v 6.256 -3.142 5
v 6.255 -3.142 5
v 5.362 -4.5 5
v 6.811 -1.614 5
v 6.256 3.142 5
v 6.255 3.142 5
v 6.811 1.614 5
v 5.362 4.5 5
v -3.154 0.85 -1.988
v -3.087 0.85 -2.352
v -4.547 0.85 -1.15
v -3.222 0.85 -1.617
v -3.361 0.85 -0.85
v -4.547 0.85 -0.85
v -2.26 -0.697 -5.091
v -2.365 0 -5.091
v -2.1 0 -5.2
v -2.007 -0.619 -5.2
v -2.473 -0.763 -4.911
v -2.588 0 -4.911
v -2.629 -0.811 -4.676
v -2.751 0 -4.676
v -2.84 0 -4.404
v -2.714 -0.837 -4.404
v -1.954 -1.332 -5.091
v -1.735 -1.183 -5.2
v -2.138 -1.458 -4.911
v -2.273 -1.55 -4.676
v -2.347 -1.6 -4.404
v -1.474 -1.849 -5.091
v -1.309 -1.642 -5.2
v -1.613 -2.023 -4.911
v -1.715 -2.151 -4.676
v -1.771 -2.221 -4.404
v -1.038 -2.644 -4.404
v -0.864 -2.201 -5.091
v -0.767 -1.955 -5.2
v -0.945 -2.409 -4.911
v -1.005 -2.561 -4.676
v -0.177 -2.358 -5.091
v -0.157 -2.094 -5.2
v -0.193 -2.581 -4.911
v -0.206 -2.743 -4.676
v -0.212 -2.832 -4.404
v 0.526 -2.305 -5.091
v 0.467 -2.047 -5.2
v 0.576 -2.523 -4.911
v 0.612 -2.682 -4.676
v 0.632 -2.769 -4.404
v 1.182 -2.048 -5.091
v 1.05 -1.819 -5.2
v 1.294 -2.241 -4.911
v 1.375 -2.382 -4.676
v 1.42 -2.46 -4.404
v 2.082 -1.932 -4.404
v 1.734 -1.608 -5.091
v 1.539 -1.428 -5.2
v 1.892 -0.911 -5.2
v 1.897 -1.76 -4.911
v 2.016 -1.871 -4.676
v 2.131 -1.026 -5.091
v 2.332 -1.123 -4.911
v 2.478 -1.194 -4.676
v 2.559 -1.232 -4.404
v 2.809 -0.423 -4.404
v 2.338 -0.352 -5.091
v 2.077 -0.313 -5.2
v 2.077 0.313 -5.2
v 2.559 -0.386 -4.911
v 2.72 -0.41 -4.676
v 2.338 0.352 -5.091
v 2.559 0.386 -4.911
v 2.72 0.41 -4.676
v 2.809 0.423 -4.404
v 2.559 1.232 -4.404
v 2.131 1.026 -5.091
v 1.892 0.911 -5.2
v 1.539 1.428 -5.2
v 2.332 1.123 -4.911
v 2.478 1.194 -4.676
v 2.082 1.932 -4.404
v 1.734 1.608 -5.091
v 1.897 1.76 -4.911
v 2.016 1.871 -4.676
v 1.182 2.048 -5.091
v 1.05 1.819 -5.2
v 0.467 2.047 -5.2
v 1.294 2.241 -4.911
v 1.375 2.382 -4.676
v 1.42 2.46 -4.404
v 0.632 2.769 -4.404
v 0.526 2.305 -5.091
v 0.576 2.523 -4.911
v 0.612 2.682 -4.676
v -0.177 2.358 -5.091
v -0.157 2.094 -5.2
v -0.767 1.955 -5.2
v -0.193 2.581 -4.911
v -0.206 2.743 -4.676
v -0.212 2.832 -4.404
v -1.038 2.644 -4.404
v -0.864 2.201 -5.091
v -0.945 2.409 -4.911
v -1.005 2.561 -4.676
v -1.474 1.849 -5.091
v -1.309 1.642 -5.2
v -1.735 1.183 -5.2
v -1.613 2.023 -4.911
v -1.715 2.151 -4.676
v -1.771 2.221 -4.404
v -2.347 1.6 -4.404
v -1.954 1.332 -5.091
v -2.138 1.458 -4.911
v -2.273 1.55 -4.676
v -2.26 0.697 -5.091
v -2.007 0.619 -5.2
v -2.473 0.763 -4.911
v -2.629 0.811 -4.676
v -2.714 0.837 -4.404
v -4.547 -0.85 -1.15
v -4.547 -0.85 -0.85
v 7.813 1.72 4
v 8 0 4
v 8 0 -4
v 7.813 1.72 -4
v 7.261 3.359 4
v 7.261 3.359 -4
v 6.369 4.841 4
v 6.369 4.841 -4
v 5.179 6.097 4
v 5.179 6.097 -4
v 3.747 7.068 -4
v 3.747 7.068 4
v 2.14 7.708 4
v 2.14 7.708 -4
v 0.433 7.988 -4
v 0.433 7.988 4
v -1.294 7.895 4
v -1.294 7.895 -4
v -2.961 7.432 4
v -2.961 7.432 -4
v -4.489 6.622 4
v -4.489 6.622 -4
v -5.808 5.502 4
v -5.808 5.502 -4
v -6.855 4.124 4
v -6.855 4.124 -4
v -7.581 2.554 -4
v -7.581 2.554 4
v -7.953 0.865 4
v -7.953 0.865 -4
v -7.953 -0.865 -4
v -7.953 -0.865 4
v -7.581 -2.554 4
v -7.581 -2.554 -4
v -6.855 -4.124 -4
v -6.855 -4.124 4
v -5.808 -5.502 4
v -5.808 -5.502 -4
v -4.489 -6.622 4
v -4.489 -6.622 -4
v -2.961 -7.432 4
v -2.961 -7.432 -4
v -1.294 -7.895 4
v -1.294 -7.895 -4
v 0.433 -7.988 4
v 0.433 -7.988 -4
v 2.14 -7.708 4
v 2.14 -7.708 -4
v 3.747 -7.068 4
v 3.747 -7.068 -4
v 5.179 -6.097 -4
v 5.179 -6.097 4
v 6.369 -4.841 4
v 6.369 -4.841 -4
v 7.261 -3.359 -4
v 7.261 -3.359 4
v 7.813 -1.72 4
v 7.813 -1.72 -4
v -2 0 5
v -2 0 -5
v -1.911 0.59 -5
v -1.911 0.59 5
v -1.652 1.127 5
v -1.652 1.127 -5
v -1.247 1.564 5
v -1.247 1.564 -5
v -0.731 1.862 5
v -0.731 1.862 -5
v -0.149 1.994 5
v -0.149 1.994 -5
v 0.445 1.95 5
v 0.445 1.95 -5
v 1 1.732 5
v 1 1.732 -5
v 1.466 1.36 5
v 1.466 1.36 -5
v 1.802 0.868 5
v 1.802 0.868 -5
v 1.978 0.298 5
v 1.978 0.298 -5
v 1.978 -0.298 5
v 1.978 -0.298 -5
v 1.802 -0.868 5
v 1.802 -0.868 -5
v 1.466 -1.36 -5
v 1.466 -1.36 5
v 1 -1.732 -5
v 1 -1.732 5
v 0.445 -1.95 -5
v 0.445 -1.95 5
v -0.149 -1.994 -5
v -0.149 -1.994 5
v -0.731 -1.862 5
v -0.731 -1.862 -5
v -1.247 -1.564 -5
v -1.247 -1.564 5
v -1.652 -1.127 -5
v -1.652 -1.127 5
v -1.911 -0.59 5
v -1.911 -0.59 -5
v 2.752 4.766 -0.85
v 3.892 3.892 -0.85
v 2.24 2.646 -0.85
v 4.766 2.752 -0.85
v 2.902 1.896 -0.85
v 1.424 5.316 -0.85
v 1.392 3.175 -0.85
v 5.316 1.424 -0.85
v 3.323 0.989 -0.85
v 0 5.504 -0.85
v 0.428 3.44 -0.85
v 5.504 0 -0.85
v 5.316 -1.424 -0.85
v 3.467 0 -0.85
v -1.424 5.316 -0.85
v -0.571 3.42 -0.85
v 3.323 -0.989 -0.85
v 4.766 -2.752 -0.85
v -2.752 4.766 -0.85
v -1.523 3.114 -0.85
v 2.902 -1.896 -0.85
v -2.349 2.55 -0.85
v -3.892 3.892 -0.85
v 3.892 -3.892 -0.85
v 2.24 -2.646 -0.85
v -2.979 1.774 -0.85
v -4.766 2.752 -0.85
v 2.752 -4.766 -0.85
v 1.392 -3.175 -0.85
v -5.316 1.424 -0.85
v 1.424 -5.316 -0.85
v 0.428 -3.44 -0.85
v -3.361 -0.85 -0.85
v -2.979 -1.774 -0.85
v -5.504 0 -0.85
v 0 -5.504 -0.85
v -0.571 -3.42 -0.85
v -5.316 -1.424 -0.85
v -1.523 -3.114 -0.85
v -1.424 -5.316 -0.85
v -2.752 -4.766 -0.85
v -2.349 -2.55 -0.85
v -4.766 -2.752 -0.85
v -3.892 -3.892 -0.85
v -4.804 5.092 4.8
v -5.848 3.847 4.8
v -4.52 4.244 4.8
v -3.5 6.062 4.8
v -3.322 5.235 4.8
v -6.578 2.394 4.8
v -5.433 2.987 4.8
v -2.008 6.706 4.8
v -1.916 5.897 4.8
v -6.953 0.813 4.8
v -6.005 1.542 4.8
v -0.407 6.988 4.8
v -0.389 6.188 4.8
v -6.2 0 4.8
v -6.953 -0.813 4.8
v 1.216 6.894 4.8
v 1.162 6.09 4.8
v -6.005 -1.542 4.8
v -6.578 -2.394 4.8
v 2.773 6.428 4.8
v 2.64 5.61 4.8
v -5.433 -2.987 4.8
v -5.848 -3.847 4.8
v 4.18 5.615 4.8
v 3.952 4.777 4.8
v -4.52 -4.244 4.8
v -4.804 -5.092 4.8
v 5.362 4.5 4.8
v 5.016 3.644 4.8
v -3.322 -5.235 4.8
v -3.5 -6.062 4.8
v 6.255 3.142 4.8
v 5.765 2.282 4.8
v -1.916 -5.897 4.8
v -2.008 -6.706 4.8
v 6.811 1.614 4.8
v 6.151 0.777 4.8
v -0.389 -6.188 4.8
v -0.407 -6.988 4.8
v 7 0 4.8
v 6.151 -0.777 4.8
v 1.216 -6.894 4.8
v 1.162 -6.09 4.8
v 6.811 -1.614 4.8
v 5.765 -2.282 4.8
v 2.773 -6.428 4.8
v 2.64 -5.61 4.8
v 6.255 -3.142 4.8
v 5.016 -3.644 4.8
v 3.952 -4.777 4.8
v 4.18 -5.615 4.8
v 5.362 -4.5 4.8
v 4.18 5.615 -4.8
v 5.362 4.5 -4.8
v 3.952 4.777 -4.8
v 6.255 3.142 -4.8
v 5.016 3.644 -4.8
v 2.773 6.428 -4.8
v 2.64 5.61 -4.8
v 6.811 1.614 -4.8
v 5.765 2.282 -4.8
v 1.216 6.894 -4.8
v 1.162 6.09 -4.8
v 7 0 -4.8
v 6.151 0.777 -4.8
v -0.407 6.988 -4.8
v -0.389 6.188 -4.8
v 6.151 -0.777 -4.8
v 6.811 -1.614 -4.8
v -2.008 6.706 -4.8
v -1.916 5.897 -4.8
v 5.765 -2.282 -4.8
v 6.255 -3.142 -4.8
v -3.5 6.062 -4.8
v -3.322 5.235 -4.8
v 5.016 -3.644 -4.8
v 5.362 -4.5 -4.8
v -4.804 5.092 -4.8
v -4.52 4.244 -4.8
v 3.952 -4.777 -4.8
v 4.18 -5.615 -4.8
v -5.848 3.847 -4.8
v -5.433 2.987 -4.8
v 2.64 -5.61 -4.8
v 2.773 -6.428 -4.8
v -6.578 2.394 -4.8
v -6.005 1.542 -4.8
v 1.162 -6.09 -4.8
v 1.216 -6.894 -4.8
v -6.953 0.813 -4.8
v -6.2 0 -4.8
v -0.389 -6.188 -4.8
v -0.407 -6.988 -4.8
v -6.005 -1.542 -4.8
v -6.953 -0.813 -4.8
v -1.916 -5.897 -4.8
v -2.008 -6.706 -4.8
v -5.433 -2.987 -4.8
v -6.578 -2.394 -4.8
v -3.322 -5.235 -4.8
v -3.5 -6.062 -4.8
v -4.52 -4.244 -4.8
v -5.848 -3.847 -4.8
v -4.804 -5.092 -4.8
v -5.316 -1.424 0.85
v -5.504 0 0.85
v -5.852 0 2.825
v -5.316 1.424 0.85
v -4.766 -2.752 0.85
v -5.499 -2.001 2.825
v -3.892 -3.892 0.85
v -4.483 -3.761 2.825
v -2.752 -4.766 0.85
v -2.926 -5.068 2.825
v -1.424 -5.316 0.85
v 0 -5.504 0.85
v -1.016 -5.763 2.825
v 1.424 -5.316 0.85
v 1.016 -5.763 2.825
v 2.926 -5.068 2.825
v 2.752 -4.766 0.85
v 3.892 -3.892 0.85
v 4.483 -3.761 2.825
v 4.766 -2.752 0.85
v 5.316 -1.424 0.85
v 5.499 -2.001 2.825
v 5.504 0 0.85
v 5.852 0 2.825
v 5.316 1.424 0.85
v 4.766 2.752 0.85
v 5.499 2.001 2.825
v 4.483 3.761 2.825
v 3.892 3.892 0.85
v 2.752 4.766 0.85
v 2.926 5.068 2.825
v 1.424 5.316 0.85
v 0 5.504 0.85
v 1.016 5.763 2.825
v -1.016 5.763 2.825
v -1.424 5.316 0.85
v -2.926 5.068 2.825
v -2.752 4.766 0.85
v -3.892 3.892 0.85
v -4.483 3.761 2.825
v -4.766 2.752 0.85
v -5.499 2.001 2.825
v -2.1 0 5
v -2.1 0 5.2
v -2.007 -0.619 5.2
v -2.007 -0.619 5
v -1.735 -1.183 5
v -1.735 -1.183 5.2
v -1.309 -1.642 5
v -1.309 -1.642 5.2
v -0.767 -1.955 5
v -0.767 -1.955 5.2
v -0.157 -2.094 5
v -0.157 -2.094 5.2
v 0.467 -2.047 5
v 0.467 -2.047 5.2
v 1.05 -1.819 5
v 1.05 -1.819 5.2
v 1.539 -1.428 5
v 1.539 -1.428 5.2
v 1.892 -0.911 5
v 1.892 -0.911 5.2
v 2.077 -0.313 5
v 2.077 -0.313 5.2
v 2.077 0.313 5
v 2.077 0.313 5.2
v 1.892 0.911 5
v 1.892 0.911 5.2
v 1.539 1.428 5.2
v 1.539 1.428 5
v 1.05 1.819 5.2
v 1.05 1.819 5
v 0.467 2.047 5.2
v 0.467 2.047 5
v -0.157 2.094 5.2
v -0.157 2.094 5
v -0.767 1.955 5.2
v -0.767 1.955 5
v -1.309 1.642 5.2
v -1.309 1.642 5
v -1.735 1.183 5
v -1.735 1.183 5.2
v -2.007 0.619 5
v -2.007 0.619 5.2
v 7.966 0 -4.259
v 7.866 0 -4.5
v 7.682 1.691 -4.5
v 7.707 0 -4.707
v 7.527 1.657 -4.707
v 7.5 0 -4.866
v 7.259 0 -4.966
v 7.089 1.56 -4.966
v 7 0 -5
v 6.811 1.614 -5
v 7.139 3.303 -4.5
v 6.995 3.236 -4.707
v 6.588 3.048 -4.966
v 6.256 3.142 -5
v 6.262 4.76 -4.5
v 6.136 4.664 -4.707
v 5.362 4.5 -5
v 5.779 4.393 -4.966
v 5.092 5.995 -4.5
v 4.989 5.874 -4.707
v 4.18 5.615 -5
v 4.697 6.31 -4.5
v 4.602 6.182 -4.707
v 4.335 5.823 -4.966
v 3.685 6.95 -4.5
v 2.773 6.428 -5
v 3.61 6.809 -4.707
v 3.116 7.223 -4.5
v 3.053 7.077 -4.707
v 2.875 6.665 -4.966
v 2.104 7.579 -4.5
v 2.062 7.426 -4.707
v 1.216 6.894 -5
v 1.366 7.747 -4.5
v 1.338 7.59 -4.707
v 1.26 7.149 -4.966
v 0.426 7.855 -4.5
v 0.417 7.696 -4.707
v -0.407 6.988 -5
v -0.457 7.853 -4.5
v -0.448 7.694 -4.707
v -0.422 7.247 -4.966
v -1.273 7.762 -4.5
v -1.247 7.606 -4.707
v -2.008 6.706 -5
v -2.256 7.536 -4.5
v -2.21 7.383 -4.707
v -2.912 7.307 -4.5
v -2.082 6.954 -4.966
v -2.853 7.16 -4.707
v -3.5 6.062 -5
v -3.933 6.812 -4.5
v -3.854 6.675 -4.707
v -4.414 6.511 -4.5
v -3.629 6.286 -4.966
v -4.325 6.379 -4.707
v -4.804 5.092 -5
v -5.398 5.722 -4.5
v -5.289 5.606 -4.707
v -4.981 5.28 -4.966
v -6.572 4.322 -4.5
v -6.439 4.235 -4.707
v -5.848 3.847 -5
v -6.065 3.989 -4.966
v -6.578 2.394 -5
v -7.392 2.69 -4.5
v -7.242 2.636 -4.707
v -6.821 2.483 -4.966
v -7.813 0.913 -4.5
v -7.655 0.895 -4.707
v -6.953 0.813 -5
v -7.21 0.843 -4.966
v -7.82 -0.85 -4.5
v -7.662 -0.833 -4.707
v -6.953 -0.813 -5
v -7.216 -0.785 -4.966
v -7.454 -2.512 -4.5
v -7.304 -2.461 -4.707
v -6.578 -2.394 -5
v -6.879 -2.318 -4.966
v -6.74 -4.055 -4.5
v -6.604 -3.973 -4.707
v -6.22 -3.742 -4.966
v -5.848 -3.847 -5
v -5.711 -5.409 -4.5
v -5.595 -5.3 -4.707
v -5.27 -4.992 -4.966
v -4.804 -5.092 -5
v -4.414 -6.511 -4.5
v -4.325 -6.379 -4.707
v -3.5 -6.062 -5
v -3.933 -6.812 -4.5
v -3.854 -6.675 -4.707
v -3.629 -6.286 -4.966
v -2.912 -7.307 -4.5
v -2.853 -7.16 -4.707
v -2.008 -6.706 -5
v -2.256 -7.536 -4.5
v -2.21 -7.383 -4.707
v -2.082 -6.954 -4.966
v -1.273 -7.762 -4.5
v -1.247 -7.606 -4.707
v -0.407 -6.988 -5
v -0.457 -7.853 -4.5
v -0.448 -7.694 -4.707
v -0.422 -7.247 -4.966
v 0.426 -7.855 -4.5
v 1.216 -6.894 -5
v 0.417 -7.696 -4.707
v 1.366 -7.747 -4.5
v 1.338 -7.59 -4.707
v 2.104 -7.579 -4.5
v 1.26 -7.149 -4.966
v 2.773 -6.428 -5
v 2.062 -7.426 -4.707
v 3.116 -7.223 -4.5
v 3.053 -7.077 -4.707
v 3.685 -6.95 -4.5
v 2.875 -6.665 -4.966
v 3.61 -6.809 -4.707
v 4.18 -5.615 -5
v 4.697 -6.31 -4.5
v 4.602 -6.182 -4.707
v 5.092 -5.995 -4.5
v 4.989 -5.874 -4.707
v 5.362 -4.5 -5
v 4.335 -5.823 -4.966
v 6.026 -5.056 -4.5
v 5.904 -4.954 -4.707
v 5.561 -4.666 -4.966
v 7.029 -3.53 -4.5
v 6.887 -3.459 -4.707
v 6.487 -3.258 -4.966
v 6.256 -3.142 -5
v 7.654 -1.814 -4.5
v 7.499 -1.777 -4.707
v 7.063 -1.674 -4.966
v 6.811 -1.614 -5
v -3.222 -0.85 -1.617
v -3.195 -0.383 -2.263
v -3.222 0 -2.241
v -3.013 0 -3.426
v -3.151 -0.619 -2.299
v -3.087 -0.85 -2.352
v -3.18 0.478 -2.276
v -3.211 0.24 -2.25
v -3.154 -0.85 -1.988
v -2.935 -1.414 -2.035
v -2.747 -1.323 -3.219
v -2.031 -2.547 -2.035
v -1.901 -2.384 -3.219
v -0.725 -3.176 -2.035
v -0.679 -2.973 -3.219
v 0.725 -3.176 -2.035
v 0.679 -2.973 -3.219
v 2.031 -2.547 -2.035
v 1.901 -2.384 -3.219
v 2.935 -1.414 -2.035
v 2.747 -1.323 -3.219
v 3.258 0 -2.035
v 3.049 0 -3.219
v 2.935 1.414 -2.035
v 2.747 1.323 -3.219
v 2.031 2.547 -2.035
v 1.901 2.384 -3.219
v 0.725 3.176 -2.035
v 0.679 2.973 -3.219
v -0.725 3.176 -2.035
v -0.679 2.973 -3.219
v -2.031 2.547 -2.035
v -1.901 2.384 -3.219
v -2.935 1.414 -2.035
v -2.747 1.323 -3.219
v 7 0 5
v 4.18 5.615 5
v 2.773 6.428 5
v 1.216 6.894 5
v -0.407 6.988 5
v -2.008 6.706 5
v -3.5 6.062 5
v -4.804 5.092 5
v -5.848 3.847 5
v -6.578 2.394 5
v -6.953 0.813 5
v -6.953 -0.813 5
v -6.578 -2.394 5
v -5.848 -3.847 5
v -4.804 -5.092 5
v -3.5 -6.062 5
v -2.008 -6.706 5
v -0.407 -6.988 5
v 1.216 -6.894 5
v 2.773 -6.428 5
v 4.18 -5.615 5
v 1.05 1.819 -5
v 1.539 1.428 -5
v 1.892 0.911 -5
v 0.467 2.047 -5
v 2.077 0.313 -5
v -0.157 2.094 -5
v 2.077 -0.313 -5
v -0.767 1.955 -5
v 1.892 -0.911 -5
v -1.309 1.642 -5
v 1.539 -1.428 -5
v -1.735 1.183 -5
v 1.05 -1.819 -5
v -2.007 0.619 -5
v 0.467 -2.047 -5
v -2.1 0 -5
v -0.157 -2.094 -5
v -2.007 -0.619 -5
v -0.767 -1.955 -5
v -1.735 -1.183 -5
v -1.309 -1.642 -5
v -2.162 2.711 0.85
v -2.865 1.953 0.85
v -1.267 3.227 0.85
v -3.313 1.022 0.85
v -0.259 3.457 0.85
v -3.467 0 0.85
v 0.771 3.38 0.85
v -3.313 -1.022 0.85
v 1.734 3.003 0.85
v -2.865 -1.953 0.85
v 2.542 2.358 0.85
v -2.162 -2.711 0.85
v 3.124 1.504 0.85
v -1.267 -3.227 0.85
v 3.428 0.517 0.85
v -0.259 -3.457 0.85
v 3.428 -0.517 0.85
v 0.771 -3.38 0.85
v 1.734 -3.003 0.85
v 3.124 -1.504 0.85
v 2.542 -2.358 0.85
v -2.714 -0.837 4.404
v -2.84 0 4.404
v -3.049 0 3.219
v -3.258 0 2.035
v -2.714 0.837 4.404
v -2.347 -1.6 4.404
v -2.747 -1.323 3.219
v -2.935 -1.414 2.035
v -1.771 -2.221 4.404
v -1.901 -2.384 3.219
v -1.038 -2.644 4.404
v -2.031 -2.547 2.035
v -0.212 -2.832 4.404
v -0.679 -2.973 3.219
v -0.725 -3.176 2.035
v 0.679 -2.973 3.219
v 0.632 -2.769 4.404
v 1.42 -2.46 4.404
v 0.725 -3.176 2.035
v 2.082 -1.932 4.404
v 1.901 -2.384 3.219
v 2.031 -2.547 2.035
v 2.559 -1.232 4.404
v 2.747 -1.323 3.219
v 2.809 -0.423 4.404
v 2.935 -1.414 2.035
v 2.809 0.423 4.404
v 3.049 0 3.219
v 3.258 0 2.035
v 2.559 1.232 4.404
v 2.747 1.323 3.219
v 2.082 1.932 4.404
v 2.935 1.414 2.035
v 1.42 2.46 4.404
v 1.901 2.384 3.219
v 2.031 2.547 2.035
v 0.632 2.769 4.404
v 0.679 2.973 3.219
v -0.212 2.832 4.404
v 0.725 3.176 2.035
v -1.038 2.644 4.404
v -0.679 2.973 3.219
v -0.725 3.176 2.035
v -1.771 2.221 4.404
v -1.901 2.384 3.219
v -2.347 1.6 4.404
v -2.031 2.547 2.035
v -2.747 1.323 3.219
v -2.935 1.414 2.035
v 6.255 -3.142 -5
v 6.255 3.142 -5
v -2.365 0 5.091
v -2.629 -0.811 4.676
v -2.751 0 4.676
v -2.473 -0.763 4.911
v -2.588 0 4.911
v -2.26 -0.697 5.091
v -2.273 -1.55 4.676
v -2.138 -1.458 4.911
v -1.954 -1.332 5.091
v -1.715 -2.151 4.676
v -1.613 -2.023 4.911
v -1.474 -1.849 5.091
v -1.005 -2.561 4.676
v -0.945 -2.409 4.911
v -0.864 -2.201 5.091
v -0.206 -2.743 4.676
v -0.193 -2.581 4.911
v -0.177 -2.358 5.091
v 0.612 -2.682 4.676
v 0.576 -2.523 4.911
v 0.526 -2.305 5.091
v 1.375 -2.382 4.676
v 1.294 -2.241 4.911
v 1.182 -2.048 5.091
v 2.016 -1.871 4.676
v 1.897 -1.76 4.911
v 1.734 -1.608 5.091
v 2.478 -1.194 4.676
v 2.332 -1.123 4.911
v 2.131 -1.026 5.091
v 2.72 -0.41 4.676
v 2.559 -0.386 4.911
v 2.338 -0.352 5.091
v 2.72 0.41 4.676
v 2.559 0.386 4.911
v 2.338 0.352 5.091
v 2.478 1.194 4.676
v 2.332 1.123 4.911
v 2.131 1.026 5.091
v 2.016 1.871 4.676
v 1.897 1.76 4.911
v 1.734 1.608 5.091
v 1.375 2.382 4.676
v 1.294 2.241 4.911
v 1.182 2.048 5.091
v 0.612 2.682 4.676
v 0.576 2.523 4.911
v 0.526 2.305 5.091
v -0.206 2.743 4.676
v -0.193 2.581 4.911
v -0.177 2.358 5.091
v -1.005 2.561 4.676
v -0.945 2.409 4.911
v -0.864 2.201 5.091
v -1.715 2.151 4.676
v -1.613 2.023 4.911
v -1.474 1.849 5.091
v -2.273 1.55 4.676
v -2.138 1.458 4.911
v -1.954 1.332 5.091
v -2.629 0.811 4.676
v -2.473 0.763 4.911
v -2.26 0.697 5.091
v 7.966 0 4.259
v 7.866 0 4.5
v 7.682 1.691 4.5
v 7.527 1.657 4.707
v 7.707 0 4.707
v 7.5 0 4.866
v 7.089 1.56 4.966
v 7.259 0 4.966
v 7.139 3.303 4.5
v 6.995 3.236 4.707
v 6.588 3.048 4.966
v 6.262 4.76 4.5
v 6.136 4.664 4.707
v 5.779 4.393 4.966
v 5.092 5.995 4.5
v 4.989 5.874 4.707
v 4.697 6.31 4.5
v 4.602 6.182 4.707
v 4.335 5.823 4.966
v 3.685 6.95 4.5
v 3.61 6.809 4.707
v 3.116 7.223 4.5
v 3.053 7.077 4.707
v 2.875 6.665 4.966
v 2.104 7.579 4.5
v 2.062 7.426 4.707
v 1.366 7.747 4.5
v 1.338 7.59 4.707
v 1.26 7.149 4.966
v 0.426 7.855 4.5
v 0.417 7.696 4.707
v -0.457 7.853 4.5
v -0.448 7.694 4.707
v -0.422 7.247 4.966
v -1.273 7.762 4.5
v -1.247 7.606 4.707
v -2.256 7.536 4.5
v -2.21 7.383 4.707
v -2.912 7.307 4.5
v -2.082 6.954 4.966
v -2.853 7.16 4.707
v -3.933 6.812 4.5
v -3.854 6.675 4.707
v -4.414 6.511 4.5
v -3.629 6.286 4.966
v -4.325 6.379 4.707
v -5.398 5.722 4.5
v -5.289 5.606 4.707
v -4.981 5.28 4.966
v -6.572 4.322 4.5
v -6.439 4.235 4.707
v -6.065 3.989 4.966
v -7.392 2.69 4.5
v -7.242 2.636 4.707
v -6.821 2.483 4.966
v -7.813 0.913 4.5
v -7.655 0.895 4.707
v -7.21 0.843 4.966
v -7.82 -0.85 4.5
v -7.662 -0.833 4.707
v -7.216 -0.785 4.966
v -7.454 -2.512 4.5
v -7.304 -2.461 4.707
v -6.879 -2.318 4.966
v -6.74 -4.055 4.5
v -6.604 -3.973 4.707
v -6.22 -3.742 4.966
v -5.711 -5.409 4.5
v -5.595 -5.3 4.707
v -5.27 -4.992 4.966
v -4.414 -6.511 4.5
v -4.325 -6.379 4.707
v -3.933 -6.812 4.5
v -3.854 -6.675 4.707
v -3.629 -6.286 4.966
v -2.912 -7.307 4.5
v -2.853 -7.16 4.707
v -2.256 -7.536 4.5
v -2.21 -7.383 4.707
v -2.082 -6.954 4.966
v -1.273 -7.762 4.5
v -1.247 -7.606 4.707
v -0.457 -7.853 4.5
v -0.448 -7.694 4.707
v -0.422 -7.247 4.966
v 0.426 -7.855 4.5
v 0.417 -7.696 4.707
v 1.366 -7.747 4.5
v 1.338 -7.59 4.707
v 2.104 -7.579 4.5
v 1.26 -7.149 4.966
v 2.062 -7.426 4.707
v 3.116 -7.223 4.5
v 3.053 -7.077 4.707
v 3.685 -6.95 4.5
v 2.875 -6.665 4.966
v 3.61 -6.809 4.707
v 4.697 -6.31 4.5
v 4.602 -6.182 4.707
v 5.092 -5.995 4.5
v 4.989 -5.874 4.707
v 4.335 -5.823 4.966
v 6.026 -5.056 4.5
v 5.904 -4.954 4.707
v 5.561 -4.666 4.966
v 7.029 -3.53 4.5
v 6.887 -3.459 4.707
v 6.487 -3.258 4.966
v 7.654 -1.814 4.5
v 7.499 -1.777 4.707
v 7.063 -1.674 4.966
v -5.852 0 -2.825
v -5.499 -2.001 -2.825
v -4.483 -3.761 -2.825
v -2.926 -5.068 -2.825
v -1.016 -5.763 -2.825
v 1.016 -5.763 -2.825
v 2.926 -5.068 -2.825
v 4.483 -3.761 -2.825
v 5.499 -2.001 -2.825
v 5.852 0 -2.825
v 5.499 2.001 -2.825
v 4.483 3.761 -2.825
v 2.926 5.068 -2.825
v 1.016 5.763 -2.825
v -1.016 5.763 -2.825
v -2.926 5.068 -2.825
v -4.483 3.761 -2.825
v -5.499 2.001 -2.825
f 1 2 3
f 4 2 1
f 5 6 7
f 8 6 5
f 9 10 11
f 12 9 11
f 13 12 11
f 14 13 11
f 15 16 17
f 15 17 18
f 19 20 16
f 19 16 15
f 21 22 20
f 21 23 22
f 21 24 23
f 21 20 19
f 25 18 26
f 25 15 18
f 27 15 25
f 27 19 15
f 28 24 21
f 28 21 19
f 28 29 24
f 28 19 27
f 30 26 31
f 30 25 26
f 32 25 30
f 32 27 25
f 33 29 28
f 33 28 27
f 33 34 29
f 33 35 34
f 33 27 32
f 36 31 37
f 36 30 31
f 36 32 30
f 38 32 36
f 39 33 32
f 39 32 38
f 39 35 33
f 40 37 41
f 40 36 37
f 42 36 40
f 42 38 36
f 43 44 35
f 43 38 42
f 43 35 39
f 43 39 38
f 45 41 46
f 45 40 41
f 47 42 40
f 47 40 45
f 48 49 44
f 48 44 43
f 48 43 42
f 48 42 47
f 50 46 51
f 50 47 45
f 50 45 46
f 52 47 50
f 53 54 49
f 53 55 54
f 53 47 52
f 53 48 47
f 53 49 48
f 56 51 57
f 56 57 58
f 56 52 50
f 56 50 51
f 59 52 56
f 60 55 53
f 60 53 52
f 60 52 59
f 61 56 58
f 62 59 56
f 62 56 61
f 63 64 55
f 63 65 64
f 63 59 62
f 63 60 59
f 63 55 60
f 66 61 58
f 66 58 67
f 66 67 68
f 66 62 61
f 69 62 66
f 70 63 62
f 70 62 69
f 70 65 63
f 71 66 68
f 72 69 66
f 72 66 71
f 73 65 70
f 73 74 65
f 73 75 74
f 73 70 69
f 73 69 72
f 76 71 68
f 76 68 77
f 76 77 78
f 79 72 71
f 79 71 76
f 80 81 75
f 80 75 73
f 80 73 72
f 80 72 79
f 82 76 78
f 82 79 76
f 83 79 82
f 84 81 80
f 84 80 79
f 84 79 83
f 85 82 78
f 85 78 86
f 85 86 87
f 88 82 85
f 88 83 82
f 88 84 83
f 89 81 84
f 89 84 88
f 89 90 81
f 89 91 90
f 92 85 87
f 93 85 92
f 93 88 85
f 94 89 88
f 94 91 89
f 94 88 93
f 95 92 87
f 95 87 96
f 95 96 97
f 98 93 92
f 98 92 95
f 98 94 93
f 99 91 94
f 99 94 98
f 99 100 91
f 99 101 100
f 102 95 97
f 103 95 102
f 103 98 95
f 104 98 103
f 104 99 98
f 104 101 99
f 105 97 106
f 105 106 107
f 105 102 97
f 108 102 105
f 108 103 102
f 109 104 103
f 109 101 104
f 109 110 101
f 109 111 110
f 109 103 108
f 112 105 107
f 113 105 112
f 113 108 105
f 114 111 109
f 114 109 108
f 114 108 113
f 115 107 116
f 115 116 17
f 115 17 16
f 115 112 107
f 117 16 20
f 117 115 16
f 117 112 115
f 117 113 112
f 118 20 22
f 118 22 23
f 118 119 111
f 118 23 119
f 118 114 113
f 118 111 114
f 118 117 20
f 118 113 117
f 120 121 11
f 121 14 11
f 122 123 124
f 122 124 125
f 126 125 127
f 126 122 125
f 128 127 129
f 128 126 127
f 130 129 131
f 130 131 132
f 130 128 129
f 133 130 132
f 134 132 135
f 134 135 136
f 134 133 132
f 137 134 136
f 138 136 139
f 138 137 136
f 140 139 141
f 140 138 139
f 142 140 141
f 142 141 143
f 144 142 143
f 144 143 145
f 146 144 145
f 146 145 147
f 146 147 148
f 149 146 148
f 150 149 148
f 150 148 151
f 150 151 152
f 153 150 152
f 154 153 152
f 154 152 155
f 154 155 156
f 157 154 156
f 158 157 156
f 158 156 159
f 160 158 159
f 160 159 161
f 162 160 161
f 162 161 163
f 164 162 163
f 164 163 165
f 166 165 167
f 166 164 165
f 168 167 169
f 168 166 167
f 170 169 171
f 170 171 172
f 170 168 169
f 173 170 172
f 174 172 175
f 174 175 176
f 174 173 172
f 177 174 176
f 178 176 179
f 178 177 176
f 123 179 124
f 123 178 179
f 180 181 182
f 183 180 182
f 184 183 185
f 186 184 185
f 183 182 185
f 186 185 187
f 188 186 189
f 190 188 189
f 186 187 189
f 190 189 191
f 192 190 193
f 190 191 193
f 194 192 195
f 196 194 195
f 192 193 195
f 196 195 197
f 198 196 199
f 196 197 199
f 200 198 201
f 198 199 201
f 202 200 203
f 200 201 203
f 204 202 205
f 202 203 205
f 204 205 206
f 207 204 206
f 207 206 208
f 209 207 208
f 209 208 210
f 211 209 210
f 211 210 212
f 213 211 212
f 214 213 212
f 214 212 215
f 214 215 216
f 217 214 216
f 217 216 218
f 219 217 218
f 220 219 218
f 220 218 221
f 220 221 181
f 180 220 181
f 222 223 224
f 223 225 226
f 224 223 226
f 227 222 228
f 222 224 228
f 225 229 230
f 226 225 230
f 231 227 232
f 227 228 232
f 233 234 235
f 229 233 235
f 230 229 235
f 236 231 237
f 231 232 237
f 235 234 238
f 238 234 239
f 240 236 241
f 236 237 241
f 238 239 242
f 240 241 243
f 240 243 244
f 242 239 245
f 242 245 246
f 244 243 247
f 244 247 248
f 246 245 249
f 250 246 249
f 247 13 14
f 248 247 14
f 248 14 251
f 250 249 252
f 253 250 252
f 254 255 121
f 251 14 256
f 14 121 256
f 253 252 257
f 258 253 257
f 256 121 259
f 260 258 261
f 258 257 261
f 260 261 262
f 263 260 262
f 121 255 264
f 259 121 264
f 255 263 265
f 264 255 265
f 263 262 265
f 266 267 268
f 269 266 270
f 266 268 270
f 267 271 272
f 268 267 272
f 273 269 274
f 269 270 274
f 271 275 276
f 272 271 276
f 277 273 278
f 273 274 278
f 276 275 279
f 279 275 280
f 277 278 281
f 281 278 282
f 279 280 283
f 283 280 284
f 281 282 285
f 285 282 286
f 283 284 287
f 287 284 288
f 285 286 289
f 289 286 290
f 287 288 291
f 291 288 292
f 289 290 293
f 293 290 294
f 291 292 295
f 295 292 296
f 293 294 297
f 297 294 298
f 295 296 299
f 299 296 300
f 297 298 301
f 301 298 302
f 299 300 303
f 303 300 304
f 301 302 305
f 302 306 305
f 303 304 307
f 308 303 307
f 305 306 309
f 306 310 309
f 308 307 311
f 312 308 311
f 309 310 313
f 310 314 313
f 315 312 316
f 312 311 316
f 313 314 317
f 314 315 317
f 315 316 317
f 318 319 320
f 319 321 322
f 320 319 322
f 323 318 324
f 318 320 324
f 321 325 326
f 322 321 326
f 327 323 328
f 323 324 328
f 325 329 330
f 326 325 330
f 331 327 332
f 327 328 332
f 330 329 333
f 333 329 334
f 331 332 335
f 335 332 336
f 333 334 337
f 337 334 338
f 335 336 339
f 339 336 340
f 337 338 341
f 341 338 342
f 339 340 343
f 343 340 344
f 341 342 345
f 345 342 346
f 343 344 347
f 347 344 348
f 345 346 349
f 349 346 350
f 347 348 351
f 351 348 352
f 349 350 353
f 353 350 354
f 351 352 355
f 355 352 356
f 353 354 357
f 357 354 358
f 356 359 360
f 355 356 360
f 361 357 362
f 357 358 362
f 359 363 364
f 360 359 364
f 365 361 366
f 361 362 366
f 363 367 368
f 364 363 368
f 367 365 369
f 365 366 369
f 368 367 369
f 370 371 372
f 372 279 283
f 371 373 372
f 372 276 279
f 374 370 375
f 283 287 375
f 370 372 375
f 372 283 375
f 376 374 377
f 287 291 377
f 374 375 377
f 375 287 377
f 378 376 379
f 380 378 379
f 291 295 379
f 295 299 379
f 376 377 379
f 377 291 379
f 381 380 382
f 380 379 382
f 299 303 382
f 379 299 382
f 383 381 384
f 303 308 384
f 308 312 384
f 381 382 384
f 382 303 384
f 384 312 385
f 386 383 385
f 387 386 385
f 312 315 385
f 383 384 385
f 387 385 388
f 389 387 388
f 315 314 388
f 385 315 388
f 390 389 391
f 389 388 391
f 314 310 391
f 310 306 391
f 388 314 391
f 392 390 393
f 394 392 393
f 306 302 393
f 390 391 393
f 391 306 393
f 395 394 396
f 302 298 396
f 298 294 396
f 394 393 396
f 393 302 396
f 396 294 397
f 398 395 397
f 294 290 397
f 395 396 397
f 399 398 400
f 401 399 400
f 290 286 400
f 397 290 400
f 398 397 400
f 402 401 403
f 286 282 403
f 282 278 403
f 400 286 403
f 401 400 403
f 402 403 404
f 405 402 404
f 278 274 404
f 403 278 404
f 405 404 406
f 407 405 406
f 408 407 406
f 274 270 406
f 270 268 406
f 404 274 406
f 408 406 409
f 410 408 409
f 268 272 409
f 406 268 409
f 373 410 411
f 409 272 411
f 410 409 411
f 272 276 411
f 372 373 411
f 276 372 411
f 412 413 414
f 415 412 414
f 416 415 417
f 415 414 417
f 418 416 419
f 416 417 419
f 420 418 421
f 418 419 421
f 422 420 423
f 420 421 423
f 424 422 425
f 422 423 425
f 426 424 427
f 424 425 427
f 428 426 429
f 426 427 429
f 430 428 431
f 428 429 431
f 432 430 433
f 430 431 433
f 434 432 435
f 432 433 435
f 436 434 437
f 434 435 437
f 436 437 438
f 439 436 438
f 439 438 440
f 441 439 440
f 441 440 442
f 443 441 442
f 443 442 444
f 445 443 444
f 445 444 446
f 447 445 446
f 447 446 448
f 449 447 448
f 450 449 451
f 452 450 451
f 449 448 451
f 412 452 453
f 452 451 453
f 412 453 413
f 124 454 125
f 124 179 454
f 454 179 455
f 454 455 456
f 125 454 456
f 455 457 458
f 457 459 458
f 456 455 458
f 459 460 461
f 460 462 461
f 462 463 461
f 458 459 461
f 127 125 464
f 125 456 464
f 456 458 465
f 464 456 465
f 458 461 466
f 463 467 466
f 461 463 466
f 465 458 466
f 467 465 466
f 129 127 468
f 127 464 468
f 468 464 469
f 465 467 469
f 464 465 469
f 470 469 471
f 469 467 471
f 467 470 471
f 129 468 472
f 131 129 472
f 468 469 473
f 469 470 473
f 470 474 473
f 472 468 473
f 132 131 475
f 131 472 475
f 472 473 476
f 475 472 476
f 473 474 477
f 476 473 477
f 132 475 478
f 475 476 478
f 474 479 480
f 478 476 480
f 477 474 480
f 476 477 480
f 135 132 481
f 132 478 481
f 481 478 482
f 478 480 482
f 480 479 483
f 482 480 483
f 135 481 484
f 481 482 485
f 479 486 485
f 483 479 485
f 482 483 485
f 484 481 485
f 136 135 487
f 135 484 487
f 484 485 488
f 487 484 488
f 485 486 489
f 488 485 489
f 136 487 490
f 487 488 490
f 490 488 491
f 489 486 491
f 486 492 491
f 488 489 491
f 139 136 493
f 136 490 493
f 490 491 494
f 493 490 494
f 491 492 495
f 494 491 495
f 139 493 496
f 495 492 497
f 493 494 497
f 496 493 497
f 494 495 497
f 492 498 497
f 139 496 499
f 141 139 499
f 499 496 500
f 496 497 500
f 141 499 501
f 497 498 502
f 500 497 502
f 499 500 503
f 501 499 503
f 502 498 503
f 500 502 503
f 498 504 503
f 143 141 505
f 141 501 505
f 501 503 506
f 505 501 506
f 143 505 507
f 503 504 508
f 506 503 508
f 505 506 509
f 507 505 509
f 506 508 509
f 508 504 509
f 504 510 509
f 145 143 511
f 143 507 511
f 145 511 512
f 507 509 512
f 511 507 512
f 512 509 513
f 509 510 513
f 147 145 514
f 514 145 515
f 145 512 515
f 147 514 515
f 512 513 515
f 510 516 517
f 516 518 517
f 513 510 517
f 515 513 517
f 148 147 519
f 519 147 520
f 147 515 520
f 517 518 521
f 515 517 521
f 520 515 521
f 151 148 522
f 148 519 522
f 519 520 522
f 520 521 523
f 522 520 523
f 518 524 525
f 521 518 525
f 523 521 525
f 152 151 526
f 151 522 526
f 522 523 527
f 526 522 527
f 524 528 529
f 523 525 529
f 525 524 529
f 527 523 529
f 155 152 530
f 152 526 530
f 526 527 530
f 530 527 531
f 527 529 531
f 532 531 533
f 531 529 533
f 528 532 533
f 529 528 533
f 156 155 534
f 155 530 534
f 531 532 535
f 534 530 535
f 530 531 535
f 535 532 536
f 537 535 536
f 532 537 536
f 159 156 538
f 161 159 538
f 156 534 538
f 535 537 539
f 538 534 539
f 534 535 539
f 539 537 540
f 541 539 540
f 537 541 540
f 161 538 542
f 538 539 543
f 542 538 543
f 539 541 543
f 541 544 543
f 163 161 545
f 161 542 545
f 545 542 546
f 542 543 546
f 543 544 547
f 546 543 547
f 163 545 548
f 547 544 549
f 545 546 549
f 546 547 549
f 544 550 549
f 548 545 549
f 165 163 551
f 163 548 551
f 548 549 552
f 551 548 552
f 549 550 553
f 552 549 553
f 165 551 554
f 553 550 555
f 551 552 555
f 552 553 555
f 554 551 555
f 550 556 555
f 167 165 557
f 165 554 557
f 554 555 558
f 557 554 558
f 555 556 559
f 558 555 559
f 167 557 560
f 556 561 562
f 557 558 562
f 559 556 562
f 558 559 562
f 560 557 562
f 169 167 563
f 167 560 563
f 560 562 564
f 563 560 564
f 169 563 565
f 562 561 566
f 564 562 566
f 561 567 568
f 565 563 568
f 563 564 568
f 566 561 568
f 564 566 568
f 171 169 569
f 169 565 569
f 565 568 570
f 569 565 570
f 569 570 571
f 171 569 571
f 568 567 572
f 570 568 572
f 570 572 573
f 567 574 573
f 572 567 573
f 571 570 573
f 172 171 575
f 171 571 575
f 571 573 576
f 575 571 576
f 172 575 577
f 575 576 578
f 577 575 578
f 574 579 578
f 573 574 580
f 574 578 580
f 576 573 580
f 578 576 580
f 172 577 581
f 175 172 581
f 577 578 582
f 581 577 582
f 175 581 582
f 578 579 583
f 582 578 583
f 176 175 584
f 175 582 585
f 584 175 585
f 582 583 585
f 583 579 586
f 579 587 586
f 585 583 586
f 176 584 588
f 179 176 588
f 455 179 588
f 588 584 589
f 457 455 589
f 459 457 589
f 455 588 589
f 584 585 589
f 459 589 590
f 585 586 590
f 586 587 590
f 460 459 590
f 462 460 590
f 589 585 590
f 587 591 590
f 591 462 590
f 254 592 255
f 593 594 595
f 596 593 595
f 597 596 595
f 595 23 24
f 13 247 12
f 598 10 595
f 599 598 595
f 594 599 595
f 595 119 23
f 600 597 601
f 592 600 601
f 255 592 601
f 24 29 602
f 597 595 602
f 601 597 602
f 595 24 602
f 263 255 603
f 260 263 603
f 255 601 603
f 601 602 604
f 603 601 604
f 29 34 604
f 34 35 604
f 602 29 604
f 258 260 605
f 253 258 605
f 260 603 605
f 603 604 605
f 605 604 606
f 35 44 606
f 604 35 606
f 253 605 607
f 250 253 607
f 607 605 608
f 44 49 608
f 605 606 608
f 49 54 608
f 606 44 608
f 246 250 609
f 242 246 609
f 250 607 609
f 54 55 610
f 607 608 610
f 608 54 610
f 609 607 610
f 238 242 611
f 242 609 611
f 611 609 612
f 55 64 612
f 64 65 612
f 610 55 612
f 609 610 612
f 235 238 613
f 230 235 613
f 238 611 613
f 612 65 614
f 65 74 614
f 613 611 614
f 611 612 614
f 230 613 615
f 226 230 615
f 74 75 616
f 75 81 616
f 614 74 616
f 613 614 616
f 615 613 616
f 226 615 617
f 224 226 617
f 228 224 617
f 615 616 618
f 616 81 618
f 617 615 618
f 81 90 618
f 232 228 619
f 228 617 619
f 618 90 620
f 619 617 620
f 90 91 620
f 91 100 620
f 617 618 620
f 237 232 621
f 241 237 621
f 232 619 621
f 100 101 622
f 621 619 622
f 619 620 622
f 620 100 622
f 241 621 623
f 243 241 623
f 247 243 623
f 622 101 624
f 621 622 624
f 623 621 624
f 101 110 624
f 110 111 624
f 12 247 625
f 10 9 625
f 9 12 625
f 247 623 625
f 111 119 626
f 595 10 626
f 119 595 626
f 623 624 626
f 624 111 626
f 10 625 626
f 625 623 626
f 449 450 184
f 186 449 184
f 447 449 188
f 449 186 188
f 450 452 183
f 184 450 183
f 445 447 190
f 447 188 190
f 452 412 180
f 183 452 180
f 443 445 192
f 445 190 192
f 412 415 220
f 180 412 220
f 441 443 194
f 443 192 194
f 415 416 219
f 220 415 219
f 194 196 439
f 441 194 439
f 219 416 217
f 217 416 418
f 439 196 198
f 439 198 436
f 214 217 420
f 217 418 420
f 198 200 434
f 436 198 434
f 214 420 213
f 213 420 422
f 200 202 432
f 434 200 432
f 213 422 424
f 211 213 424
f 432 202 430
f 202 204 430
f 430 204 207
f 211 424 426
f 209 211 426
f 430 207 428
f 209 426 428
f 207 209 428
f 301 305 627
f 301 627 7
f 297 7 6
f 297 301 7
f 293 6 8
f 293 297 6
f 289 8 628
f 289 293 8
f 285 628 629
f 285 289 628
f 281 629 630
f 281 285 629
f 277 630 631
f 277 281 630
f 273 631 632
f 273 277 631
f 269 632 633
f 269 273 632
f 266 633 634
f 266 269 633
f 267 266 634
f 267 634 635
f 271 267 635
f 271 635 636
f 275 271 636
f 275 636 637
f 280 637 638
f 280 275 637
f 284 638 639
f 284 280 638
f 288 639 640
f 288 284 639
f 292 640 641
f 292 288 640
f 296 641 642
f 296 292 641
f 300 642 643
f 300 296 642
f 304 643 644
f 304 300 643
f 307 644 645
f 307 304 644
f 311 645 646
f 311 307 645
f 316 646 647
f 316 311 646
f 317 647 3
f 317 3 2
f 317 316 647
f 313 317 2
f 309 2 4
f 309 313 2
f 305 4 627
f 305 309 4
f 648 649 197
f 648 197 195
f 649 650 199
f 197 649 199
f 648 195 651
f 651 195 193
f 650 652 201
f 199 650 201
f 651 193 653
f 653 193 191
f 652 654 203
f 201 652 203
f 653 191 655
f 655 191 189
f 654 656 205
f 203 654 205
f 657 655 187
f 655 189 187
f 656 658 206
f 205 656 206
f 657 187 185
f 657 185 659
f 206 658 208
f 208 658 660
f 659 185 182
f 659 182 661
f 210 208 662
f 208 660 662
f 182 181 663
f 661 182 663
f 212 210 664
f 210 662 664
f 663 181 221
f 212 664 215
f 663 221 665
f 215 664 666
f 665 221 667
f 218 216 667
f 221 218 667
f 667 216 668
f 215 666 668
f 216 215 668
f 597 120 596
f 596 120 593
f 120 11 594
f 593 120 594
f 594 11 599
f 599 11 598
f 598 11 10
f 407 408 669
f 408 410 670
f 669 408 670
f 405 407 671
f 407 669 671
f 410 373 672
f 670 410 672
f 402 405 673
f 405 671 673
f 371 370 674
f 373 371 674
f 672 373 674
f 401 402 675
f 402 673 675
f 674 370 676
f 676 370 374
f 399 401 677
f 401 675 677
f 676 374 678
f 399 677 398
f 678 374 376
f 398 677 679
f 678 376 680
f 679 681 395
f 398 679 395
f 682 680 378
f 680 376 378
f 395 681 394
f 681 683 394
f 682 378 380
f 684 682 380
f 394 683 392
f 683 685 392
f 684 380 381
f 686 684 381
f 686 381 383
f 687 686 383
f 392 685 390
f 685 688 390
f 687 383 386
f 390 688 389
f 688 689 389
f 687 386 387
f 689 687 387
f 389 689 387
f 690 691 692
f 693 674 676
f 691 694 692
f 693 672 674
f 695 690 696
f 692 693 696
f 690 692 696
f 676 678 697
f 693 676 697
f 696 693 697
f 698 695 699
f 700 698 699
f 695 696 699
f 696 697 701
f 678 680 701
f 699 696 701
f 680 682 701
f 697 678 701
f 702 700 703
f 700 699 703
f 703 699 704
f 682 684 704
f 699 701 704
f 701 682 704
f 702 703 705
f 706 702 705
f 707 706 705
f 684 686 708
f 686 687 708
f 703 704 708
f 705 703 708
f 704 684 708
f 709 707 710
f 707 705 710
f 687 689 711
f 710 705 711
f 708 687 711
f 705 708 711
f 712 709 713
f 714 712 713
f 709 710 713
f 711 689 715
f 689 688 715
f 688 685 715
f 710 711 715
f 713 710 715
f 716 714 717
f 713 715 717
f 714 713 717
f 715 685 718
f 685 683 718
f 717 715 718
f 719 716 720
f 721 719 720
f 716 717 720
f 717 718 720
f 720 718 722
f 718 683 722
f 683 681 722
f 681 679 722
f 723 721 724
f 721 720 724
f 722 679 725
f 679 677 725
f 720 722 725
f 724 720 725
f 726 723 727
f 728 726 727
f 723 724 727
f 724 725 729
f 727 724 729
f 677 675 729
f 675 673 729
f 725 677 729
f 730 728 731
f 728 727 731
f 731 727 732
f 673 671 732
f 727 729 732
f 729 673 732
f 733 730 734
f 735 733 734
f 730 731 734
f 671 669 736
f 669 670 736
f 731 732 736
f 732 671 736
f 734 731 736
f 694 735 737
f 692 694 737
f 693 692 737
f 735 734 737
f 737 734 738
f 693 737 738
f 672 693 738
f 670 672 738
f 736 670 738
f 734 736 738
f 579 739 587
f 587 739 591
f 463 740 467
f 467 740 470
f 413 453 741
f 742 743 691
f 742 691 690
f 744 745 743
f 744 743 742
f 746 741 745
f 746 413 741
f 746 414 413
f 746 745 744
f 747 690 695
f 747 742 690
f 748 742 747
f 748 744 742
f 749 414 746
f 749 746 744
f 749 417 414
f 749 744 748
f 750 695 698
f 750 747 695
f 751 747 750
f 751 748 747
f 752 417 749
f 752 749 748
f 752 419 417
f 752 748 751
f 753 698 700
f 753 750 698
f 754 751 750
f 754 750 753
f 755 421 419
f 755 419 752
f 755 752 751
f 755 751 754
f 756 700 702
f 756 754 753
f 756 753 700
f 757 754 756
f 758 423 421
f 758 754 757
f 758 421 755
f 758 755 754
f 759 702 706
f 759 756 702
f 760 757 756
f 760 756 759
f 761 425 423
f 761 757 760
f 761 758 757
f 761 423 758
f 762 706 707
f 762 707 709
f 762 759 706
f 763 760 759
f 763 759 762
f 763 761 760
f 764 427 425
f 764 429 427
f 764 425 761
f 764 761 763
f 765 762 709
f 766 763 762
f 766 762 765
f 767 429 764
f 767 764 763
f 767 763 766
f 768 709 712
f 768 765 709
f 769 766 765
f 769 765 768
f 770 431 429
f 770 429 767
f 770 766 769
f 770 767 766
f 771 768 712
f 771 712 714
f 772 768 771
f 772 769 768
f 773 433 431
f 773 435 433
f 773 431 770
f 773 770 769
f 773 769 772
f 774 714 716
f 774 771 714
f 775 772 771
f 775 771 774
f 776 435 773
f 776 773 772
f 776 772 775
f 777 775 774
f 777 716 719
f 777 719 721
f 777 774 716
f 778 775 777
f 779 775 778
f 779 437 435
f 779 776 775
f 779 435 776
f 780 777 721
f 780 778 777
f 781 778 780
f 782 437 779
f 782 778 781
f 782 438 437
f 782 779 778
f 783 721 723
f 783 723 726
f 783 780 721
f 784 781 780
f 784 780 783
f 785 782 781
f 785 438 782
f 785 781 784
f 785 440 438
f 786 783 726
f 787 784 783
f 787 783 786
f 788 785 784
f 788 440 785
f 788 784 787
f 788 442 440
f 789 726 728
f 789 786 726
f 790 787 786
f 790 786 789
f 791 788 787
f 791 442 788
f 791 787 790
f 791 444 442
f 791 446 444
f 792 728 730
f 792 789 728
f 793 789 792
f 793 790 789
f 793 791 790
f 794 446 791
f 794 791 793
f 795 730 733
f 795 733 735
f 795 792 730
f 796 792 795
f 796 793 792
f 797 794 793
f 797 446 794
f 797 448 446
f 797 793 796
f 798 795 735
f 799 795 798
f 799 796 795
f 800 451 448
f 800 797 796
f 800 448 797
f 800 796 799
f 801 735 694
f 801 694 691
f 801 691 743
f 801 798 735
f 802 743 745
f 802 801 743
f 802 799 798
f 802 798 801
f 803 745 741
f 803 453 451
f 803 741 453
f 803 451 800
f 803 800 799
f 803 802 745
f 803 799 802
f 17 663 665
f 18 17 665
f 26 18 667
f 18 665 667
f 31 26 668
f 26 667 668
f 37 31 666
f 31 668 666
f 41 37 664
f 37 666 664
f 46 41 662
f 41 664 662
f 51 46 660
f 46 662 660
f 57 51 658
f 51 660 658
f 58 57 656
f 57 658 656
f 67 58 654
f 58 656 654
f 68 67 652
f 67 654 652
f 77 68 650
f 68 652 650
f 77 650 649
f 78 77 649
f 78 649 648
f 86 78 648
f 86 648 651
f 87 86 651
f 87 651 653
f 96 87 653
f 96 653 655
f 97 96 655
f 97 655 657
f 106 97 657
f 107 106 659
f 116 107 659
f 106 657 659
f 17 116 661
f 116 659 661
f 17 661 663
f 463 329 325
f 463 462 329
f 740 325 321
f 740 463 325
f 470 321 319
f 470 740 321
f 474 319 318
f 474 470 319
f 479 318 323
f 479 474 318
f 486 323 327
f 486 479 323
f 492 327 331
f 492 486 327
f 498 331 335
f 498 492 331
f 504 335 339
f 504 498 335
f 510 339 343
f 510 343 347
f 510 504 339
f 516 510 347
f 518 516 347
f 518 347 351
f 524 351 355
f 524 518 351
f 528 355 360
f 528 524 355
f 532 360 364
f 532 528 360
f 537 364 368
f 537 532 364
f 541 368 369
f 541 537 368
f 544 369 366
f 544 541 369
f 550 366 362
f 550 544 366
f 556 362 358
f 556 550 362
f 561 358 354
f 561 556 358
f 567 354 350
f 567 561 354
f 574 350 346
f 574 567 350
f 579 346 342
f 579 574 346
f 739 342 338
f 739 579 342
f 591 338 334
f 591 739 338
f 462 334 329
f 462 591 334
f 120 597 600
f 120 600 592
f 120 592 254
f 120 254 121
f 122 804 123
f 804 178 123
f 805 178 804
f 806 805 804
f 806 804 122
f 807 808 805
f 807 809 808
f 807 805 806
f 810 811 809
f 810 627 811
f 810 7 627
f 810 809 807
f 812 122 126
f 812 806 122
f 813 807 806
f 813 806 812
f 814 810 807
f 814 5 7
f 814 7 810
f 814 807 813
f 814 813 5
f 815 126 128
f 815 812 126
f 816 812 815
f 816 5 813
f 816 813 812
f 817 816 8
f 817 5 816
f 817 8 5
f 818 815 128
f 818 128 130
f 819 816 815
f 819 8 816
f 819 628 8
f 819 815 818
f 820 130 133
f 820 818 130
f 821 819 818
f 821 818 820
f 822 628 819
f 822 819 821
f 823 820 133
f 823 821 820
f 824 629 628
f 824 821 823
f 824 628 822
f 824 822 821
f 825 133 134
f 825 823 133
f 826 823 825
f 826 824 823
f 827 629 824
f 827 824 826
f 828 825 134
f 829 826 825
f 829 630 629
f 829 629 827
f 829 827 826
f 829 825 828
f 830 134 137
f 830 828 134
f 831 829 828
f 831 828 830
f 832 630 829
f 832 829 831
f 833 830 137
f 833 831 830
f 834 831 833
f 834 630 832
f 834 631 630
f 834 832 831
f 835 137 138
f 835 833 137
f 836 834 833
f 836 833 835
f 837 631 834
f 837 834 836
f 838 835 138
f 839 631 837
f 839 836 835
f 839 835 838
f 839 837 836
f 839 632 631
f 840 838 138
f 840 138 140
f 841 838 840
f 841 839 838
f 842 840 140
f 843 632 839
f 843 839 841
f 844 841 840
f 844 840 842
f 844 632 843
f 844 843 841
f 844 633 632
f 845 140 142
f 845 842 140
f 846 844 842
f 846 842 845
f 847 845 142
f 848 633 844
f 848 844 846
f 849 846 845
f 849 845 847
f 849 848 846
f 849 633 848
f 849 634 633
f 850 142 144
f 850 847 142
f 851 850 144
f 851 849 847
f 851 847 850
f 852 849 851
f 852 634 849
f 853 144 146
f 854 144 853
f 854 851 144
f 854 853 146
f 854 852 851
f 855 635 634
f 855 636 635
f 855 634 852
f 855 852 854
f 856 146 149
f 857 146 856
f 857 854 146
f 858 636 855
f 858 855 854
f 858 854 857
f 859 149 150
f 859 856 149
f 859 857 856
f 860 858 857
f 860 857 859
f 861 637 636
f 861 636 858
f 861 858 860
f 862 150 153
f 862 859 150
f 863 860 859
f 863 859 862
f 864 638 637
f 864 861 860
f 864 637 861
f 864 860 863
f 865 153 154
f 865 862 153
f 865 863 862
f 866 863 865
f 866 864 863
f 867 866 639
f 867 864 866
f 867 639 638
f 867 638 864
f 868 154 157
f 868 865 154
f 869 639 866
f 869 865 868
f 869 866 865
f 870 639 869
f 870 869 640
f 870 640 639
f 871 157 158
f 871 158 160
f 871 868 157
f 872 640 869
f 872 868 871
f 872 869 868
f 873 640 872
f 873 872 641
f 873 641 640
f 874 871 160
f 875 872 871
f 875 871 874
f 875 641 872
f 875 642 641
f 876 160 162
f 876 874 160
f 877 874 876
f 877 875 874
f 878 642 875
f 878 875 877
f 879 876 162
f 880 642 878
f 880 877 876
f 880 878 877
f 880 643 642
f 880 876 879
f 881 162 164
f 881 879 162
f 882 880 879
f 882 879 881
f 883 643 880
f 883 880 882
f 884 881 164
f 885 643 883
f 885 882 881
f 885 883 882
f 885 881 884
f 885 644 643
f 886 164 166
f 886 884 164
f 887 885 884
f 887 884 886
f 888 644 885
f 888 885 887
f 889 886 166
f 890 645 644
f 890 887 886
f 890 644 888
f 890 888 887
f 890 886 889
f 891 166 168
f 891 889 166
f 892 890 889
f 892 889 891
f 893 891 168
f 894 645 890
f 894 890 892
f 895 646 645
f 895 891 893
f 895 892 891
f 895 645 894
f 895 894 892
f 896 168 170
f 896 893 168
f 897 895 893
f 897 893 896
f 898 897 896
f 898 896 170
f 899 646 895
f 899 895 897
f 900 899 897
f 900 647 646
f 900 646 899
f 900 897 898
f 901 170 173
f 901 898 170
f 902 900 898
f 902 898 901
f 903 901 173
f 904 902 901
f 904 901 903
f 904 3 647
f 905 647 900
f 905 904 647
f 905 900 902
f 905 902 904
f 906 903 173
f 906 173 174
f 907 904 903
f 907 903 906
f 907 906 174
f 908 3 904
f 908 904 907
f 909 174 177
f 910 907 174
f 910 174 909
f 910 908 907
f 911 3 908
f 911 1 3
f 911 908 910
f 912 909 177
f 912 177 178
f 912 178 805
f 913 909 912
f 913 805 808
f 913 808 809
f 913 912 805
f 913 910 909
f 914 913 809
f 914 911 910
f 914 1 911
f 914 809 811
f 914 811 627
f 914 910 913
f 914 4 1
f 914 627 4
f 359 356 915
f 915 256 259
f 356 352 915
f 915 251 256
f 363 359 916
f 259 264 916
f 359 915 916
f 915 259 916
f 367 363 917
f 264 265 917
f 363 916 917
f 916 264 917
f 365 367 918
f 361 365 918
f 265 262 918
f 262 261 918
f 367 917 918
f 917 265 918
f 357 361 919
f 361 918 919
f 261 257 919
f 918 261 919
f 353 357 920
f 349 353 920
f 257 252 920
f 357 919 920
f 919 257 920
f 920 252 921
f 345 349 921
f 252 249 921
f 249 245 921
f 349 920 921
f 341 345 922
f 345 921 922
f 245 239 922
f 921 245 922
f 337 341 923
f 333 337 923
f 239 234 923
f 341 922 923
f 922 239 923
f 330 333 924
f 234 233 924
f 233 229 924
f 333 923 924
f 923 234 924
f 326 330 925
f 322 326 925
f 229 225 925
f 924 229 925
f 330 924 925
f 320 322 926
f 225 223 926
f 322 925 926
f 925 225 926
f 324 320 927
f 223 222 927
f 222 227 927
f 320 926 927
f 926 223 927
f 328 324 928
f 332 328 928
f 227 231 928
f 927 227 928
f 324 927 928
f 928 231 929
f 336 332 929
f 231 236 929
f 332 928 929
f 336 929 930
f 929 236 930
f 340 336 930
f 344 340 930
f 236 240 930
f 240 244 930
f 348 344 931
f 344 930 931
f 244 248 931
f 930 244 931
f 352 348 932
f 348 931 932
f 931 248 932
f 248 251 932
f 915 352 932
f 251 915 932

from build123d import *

# Parameters (mm, degrees)
SKETCH1_R           = 7.999999999999998
SKETCH1_R_2         = 7
BOSS_EXTRUDE1_DEPTH = 5
FILLET1_R           = 1
BOSS_EXTRUDE2_DEPTH = 0.85
SKETCH4_R           = 2
CUT_EXTRUDE1_DEPTH  = 16.23285921946369
FILLET3_R           = 1
FILLET4_R           = 1


# Some blends are built 0.0001 mm under size
with BuildPart() as part:
    # Sketch1 → Boss-Extrude1 (new, symmetric)
    with BuildSketch(Plane.XY):
        Circle(SKETCH1_R)
        Circle(SKETCH1_R_2, mode=Mode.SUBTRACT)
    extrude(amount=BOSS_EXTRUDE1_DEPTH, both=True)

    # Fillet1
    fillet1_edges = [part.edges().sort_by_distance(p)[0] for p in [
        (-7.999999999999998, 9.8e-16, -5),
        (-7.999999999999998, 9.8e-16, 5),
    ]]
    fillet(fillet1_edges, radius=FILLET1_R - 0.0001)  # a hair under: the kernel refuses the full size

    # Sketch2 → Revolve1 (revolve)
    with BuildSketch(Plane(origin=(0, 0, 0), x_dir=(1, 0, 0), z_dir=(0, 1, 0))):
        Polygon((4e-17, 5), (1.26e-15, -5), (-2.099999999999999, -4.999999999999999), (-2.0999999999999996, -5.200000000000002), (-2.6999999999999993, -5.200000000000002), (-3.4670223660818085, -0.8500000000000001), (-5.503508426201579, -0.8500000000000006), (-6.199999999999999, -4.800000000000001), (-6.999999999999999, -4.800000000000001), (-7, 4.799999999999999), (-6.2, 4.799999999999999), (-5.503508426201579, 0.8499999999999993), (-3.4670223660818085, 0.8499999999999992), (-2.7000000000000006, 5.200000000000002), (-2.1000000000000005, 5.200000000000002), (-2.1, 4.999999999999999), align=None)
    revolve(axis=Axis((4e-17, 0, -5), (1.2e-16, 0, 1)))

    # Sketch3 → Boss-Extrude2 (add, symmetric)
    with BuildSketch(Plane(origin=(0, 0, 0), x_dir=(1, 0, 0), z_dir=(0, 1, 0))):
        Polygon((-2.546735183281943, 2.550000000000001), (-2.546735183281943, 0.8500000000000001), (-4.546735183281943, 0.850000000000001), (-4.546735183281943, 1.15), (-2.846735183281943, 2.5500000000000003), align=None)
    extrude(amount=BOSS_EXTRUDE2_DEPTH, both=True)

    # Sketch4 → Cut-Extrude1 (cut, through all)
    with BuildSketch(Plane(origin=(-6.1e-16, 0, -4.999999999999999), x_dir=(-1, 0, 0), z_dir=(0, 0, -1))):
        Circle(SKETCH4_R)
    extrude(amount=-CUT_EXTRUDE1_DEPTH, mode=Mode.SUBTRACT)

    # Fillet3
    # the kernel refuses this fillet: 1 mm, written as the material it takes off along each edge
    with BuildSketch(Plane(origin=(1.29e-15, 0, 5.200000000000003), x_dir=(-1, 0, 0), z_dir=(0, 1, 0))) as fillet3_piece_1:
        with BuildLine():
            CenterArc((1.8555509868612252, -0.9696621473355957), FILLET3_R, 9.99999999999983, 65.85072553441276)
            Line((2.100000000000001, 0), (2.1048889802627766, 0.01939324294671163))
            ThreePointArc((2.1048889802627766, 0.01939324294671163), (2.4000000000000004, 0.01999999999999957), (2.7000000000000006, 0.01999999999999957))
            Line((2.7000000000000006, 0.01999999999999957), (2.719696155060245, 0.00347296355333881))
            Line((2.719696155060245, 0.00347296355333881), (2.860054894933678, -0.7925410061153295))
            Line((2.860054894933678, -0.7925410061153295), (2.840358739873434, -0.7960139696686683))
        make_face()
    revolve(axis=Axis((1.29e-15, 0, 5.200000000000003), (1.2e-16, 0, 1)), mode=Mode.SUBTRACT)

    # Fillet4
    # the kernel refuses this fillet: 1 mm, written as the material it takes off along each edge
    with BuildSketch(Plane(origin=(1e-17, 0, -5.200000000000002), x_dir=(-1, 0, 0), z_dir=(0, 1, 0))) as fillet4_piece_1:
        with BuildLine():
            CenterArc((1.8555509868612252, 0.9696621473355957), FILLET4_R, 284.1492744655874, 65.85072553441279)
            Line((2.1000000000000005, 0), (2.104888980262776, -0.01939324294671163))
            ThreePointArc((2.104888980262776, -0.01939324294671163), (2.4000000000000004, -0.01999999999999957), (2.7000000000000006, -0.01999999999999957))
            Line((2.7000000000000006, -0.01999999999999957), (2.719696155060245, -0.00347296355333881))
            Line((2.719696155060245, -0.00347296355333881), (2.860054894933678, 0.7925410061153295))
            Line((2.860054894933678, 0.7925410061153295), (2.840358739873434, 0.7960139696686683))
        make_face()
    revolve(axis=Axis((1e-17, 0, -5.200000000000002), (1.2e-16, 0, 1)), mode=Mode.SUBTRACT)


solid = part.part
